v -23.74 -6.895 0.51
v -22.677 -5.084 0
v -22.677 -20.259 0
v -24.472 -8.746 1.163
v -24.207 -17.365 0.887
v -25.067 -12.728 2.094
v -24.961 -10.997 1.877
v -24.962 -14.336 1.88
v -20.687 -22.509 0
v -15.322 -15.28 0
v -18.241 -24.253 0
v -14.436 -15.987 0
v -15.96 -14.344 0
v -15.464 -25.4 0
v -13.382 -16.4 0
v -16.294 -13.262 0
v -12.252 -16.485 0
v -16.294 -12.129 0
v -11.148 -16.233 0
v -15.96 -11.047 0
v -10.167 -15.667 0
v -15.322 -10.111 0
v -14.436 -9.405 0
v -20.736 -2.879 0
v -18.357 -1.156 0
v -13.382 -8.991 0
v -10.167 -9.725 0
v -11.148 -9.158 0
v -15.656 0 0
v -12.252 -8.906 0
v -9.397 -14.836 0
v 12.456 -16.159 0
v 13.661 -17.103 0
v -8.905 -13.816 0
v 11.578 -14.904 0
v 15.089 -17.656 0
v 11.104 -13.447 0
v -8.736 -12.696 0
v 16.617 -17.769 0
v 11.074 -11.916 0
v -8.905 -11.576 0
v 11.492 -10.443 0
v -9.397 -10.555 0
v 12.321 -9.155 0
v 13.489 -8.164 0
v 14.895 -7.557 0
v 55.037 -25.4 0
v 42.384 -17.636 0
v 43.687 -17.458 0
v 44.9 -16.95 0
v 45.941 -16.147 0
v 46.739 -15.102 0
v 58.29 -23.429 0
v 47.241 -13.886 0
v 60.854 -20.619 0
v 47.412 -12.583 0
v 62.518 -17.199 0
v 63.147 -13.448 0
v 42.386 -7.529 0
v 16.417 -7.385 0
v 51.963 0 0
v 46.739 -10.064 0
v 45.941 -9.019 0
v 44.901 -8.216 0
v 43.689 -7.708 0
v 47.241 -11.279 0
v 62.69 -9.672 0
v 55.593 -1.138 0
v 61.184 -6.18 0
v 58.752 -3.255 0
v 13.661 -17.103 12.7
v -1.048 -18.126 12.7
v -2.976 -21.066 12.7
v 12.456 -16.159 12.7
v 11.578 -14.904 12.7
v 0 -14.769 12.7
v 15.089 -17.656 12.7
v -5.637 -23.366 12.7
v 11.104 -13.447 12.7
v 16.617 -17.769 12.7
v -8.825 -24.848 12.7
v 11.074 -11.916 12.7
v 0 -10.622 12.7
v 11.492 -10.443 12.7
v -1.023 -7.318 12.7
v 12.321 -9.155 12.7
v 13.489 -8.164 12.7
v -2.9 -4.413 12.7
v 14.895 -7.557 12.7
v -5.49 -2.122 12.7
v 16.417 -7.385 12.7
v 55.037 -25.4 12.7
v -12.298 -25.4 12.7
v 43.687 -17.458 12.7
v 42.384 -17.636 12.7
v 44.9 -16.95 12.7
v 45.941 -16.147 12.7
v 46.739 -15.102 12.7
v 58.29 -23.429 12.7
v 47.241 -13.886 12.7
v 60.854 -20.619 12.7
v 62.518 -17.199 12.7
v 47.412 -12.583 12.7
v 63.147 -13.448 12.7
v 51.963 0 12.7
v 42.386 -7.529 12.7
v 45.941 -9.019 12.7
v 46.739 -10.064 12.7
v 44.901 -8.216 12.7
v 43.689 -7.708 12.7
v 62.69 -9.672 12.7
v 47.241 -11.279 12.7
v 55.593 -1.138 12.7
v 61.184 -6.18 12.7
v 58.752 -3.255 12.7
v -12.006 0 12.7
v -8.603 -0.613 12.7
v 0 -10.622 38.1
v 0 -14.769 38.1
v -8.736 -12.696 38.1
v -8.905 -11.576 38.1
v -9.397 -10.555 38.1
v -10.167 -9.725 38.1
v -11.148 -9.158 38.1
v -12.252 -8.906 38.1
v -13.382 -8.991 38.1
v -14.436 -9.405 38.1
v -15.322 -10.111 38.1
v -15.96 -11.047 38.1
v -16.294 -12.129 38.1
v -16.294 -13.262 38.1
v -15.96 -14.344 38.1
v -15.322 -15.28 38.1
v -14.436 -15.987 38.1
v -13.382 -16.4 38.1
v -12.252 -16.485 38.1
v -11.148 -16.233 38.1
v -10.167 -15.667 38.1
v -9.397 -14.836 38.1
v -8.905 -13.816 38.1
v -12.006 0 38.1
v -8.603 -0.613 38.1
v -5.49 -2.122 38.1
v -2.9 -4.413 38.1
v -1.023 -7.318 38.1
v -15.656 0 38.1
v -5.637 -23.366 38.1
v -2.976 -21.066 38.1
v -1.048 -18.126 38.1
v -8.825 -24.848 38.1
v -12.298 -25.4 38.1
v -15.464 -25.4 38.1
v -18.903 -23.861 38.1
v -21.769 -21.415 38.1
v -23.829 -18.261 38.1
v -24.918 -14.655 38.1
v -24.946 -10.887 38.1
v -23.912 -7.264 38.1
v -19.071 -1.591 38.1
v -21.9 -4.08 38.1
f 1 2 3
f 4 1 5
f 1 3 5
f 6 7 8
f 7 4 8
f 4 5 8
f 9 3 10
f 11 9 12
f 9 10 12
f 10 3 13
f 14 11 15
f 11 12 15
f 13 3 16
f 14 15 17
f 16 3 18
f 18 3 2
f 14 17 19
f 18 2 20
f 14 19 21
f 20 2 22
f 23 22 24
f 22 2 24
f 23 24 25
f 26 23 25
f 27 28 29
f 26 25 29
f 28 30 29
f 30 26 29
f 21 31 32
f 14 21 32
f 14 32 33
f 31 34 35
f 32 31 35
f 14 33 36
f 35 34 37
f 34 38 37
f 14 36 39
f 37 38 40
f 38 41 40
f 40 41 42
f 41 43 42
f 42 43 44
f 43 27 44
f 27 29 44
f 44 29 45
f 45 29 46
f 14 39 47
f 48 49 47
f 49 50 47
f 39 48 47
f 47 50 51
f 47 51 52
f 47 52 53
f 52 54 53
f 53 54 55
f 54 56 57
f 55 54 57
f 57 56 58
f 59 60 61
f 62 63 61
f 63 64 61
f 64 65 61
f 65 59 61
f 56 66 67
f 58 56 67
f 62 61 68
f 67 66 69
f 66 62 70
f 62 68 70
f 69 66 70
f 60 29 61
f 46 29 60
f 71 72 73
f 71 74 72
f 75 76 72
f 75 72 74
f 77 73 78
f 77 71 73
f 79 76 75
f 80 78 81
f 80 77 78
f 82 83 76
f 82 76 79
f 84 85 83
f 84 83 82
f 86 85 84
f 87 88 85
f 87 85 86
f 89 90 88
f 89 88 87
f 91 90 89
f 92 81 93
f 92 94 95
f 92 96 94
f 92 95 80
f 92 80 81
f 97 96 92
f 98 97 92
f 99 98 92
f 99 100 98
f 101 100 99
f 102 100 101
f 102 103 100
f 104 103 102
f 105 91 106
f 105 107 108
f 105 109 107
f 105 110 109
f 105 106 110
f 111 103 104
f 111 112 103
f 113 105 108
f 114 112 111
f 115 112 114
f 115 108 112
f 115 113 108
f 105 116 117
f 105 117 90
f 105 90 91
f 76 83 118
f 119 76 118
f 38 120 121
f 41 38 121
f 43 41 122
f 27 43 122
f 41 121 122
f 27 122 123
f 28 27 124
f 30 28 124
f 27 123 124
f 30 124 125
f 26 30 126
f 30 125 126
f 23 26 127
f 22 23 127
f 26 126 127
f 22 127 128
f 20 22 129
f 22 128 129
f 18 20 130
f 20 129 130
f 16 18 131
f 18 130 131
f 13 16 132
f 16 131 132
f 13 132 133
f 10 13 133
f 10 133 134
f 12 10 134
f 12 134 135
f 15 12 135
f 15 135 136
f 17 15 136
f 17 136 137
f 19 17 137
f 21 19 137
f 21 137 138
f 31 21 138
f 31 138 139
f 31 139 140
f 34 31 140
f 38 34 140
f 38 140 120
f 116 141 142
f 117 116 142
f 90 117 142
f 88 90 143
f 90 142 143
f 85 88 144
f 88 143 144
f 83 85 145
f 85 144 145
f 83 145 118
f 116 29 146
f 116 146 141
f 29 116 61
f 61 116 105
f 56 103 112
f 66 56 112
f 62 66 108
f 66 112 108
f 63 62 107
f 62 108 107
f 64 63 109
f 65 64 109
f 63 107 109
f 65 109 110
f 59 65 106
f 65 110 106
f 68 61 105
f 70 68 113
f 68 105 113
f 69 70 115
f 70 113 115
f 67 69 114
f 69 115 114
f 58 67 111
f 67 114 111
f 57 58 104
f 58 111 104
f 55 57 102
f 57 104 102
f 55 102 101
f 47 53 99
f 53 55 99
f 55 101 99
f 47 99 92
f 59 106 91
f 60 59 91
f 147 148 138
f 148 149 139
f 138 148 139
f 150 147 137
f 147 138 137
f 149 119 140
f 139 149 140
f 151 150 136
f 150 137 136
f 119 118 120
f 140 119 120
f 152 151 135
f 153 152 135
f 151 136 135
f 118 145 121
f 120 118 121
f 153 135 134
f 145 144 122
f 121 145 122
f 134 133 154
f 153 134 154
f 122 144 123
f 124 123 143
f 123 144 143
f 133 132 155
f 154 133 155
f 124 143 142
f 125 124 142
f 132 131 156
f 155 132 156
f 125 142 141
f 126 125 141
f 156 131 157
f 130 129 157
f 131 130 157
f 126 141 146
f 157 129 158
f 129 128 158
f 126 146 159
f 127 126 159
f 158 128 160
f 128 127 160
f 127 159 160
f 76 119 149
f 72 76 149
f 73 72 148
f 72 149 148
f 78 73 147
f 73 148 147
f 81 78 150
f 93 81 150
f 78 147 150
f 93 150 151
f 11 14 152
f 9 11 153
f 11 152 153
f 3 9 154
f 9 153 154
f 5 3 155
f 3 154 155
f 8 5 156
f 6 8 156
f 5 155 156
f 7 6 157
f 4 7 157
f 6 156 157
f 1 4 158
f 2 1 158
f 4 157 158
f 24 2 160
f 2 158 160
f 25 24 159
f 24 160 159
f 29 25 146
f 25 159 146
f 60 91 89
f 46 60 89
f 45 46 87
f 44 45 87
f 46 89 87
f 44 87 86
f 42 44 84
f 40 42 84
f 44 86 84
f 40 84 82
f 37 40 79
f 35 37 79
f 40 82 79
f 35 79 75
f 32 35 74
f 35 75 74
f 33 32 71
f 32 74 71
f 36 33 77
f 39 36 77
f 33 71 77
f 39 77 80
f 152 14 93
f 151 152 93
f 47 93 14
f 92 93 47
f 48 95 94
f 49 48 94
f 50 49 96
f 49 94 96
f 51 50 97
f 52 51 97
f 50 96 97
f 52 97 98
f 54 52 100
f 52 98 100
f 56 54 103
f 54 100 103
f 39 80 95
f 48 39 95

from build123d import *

# Parameters (mm, degrees)
F1_DEPTH  = 25.4
F3_DEPTH  = 25.4
F5_DEPTH  = 25.4
F7_DEPTH  = 25.4
F9_DEPTH  = 50.8
F13_DEPTH = 25.4
F14_R     = 3.8000451494
F15_DEPTH = 76.2
F17_DEPTH = 25.4


# Not quite as in the source:
# - the program builds the solid bodies; features that only make, move or delete a surface that nothing else refers to are left out


with BuildPart() as f1:
    # F0 (on Front) → F1 (new body)
    with BuildSketch(Plane.XZ):
        Polygon((-25.4, 38.1), (-25.4, 0), (63.5, 0), (63.5, 12.7), (0, 12.7), (0, 38.1), align=None)
    extrude(amount=F1_DEPTH)

    # F2 (on face) → F3 (cut)
    with BuildSketch(Plane.XZ.offset(25.4)):
        with BuildLine():
            ThreePointArc((-22.676864444, 0), (-24.571583371, 1.2835083224), (-25.4, 3.4168342035))
            Line((-25.4, 3.4168342035), (-25.4, 0))
            Line((-25.4, 0), (-22.676864444, 0))
        make_face()
    extrude(amount=-F3_DEPTH, mode=Mode.SUBTRACT)

    # F4 (on face) → F5 (cut)
    with BuildSketch(Plane.XY.offset(12.7)):
        with BuildLine():
            ThreePointArc((51.9632771611, 0), (63.0542215265, -11.5438688547), (55.0368912518, -25.4))
            Line((55.0368912518, -25.4), (63.5, -25.4))
            Line((63.5, -25.4), (63.5, 0))
            Line((63.5, 0), (51.9632771611, 0))
        make_face()
    extrude(amount=-F5_DEPTH, mode=Mode.SUBTRACT)

    # F6 (on face) → F7 (cut)
    with BuildSketch(Plane.XY.offset(38.1)):
        with BuildLine():
            ThreePointArc((-15.4641177505, -25.4), (-25.0669029781, -12.7718994312), (-15.6562179327, 0))
            Line((-15.6562179327, 0), (-25.4, 0))
            Line((-25.4, 0), (-25.4, -25.4))
            Line((-25.4, -25.4), (-15.4641177505, -25.4))
        make_face()
    extrude(amount=-F7_DEPTH, mode=Mode.SUBTRACT)

    # F8 (on face) → F9 (cut)
    with BuildSketch(Plane.XY.offset(12.7)):
        with BuildLine():
            Line((-25.4, 0), (-25.4, -25.4))
            Line((-25.4, -25.4), (-15.4641177505, -25.4))
            ThreePointArc((-15.4641177505, -25.4), (-25.0669029781, -12.7718994312), (-15.6562179327, 0))
            Line((-15.6562179327, 0), (-25.4, 0))
        make_face()
    extrude(amount=-F9_DEPTH, mode=Mode.SUBTRACT)

    # F12 (on face) → F13 (cut)
    with BuildSketch(Plane.XY.offset(38.1)):
        with BuildLine():
            ThreePointArc((-12.0063023642, 0), (-4.1167210002, -3.1788126596), (0, -10.6221286028))
            Line((0, -10.6221286028), (0, 0))
            Line((0, 0), (-12.0063023642, 0))
        make_face()
        with BuildLine():
            ThreePointArc((0, -14.7690480964), (-4.2265465157, -22.308409709), (-12.2979614132, -25.4))
            Line((-12.2979614132, -25.4), (0, -25.4))
            Line((0, -25.4), (0, -14.7690480964))
        make_face()
    extrude(amount=-F13_DEPTH, mode=Mode.SUBTRACT)

    # F14 (on face) → F15 (cut)
    with BuildSketch(Plane.XY.offset(38.1)):
        with Locations((-12.53633365, -12.6955883496)):
            Circle(F14_R)
    extrude(amount=-F15_DEPTH, mode=Mode.SUBTRACT)

    # F16 (on face) → F17 (cut)
    with BuildSketch(Plane.XY.offset(12.7)):
        with BuildLine():
            ThreePointArc((16.6168020143, -17.7693230367), (20.0435798879, -16.1217506564), (21.4334555491, -12.5826057047))
            ThreePointArc((21.4334555491, -12.5826057047), (19.9746784977, -8.9706846186), (16.4166737264, -7.3849335457))
            ThreePointArc((16.4166737264, -7.3849335457), (11.0325544335, -12.6828196506), (16.6168020143, -17.7693230367))
        make_face()
        with BuildLine():
            ThreePointArc((47.4116187176, -12.5826057047), (45.9414348271, -9.0192691511), (42.3863259992, -7.5292995919))
            ThreePointArc((42.3863259992, -7.5292995919), (37.304850424, -12.5816406618), (42.3843959412, -17.6359221781))
            ThreePointArc((42.3843959412, -17.6359221781), (45.9407542727, -16.1466264756), (47.4116187176, -12.5826057047))
        make_face()
        with BuildLine():
            ThreePointArc((16.4166737264, -7.3849335457), (19.9746784977, -8.9706846186), (21.4334555491, -12.5826057047))
            ThreePointArc((21.4334555491, -12.5826057047), (20.0435798879, -16.1217506564), (16.6168020143, -17.7693230367))
            Line((16.6168020143, -17.7693230367), (42.3843959412, -17.6359221781))
            ThreePointArc((42.3843959412, -17.6359221781), (37.304850424, -12.5816406618), (42.3863259992, -7.5292995919))
            Line((42.3863259992, -7.5292995919), (16.4166737264, -7.3849335457))
        make_face()
    extrude(amount=-F17_DEPTH, mode=Mode.SUBTRACT)


solid = f1.part
